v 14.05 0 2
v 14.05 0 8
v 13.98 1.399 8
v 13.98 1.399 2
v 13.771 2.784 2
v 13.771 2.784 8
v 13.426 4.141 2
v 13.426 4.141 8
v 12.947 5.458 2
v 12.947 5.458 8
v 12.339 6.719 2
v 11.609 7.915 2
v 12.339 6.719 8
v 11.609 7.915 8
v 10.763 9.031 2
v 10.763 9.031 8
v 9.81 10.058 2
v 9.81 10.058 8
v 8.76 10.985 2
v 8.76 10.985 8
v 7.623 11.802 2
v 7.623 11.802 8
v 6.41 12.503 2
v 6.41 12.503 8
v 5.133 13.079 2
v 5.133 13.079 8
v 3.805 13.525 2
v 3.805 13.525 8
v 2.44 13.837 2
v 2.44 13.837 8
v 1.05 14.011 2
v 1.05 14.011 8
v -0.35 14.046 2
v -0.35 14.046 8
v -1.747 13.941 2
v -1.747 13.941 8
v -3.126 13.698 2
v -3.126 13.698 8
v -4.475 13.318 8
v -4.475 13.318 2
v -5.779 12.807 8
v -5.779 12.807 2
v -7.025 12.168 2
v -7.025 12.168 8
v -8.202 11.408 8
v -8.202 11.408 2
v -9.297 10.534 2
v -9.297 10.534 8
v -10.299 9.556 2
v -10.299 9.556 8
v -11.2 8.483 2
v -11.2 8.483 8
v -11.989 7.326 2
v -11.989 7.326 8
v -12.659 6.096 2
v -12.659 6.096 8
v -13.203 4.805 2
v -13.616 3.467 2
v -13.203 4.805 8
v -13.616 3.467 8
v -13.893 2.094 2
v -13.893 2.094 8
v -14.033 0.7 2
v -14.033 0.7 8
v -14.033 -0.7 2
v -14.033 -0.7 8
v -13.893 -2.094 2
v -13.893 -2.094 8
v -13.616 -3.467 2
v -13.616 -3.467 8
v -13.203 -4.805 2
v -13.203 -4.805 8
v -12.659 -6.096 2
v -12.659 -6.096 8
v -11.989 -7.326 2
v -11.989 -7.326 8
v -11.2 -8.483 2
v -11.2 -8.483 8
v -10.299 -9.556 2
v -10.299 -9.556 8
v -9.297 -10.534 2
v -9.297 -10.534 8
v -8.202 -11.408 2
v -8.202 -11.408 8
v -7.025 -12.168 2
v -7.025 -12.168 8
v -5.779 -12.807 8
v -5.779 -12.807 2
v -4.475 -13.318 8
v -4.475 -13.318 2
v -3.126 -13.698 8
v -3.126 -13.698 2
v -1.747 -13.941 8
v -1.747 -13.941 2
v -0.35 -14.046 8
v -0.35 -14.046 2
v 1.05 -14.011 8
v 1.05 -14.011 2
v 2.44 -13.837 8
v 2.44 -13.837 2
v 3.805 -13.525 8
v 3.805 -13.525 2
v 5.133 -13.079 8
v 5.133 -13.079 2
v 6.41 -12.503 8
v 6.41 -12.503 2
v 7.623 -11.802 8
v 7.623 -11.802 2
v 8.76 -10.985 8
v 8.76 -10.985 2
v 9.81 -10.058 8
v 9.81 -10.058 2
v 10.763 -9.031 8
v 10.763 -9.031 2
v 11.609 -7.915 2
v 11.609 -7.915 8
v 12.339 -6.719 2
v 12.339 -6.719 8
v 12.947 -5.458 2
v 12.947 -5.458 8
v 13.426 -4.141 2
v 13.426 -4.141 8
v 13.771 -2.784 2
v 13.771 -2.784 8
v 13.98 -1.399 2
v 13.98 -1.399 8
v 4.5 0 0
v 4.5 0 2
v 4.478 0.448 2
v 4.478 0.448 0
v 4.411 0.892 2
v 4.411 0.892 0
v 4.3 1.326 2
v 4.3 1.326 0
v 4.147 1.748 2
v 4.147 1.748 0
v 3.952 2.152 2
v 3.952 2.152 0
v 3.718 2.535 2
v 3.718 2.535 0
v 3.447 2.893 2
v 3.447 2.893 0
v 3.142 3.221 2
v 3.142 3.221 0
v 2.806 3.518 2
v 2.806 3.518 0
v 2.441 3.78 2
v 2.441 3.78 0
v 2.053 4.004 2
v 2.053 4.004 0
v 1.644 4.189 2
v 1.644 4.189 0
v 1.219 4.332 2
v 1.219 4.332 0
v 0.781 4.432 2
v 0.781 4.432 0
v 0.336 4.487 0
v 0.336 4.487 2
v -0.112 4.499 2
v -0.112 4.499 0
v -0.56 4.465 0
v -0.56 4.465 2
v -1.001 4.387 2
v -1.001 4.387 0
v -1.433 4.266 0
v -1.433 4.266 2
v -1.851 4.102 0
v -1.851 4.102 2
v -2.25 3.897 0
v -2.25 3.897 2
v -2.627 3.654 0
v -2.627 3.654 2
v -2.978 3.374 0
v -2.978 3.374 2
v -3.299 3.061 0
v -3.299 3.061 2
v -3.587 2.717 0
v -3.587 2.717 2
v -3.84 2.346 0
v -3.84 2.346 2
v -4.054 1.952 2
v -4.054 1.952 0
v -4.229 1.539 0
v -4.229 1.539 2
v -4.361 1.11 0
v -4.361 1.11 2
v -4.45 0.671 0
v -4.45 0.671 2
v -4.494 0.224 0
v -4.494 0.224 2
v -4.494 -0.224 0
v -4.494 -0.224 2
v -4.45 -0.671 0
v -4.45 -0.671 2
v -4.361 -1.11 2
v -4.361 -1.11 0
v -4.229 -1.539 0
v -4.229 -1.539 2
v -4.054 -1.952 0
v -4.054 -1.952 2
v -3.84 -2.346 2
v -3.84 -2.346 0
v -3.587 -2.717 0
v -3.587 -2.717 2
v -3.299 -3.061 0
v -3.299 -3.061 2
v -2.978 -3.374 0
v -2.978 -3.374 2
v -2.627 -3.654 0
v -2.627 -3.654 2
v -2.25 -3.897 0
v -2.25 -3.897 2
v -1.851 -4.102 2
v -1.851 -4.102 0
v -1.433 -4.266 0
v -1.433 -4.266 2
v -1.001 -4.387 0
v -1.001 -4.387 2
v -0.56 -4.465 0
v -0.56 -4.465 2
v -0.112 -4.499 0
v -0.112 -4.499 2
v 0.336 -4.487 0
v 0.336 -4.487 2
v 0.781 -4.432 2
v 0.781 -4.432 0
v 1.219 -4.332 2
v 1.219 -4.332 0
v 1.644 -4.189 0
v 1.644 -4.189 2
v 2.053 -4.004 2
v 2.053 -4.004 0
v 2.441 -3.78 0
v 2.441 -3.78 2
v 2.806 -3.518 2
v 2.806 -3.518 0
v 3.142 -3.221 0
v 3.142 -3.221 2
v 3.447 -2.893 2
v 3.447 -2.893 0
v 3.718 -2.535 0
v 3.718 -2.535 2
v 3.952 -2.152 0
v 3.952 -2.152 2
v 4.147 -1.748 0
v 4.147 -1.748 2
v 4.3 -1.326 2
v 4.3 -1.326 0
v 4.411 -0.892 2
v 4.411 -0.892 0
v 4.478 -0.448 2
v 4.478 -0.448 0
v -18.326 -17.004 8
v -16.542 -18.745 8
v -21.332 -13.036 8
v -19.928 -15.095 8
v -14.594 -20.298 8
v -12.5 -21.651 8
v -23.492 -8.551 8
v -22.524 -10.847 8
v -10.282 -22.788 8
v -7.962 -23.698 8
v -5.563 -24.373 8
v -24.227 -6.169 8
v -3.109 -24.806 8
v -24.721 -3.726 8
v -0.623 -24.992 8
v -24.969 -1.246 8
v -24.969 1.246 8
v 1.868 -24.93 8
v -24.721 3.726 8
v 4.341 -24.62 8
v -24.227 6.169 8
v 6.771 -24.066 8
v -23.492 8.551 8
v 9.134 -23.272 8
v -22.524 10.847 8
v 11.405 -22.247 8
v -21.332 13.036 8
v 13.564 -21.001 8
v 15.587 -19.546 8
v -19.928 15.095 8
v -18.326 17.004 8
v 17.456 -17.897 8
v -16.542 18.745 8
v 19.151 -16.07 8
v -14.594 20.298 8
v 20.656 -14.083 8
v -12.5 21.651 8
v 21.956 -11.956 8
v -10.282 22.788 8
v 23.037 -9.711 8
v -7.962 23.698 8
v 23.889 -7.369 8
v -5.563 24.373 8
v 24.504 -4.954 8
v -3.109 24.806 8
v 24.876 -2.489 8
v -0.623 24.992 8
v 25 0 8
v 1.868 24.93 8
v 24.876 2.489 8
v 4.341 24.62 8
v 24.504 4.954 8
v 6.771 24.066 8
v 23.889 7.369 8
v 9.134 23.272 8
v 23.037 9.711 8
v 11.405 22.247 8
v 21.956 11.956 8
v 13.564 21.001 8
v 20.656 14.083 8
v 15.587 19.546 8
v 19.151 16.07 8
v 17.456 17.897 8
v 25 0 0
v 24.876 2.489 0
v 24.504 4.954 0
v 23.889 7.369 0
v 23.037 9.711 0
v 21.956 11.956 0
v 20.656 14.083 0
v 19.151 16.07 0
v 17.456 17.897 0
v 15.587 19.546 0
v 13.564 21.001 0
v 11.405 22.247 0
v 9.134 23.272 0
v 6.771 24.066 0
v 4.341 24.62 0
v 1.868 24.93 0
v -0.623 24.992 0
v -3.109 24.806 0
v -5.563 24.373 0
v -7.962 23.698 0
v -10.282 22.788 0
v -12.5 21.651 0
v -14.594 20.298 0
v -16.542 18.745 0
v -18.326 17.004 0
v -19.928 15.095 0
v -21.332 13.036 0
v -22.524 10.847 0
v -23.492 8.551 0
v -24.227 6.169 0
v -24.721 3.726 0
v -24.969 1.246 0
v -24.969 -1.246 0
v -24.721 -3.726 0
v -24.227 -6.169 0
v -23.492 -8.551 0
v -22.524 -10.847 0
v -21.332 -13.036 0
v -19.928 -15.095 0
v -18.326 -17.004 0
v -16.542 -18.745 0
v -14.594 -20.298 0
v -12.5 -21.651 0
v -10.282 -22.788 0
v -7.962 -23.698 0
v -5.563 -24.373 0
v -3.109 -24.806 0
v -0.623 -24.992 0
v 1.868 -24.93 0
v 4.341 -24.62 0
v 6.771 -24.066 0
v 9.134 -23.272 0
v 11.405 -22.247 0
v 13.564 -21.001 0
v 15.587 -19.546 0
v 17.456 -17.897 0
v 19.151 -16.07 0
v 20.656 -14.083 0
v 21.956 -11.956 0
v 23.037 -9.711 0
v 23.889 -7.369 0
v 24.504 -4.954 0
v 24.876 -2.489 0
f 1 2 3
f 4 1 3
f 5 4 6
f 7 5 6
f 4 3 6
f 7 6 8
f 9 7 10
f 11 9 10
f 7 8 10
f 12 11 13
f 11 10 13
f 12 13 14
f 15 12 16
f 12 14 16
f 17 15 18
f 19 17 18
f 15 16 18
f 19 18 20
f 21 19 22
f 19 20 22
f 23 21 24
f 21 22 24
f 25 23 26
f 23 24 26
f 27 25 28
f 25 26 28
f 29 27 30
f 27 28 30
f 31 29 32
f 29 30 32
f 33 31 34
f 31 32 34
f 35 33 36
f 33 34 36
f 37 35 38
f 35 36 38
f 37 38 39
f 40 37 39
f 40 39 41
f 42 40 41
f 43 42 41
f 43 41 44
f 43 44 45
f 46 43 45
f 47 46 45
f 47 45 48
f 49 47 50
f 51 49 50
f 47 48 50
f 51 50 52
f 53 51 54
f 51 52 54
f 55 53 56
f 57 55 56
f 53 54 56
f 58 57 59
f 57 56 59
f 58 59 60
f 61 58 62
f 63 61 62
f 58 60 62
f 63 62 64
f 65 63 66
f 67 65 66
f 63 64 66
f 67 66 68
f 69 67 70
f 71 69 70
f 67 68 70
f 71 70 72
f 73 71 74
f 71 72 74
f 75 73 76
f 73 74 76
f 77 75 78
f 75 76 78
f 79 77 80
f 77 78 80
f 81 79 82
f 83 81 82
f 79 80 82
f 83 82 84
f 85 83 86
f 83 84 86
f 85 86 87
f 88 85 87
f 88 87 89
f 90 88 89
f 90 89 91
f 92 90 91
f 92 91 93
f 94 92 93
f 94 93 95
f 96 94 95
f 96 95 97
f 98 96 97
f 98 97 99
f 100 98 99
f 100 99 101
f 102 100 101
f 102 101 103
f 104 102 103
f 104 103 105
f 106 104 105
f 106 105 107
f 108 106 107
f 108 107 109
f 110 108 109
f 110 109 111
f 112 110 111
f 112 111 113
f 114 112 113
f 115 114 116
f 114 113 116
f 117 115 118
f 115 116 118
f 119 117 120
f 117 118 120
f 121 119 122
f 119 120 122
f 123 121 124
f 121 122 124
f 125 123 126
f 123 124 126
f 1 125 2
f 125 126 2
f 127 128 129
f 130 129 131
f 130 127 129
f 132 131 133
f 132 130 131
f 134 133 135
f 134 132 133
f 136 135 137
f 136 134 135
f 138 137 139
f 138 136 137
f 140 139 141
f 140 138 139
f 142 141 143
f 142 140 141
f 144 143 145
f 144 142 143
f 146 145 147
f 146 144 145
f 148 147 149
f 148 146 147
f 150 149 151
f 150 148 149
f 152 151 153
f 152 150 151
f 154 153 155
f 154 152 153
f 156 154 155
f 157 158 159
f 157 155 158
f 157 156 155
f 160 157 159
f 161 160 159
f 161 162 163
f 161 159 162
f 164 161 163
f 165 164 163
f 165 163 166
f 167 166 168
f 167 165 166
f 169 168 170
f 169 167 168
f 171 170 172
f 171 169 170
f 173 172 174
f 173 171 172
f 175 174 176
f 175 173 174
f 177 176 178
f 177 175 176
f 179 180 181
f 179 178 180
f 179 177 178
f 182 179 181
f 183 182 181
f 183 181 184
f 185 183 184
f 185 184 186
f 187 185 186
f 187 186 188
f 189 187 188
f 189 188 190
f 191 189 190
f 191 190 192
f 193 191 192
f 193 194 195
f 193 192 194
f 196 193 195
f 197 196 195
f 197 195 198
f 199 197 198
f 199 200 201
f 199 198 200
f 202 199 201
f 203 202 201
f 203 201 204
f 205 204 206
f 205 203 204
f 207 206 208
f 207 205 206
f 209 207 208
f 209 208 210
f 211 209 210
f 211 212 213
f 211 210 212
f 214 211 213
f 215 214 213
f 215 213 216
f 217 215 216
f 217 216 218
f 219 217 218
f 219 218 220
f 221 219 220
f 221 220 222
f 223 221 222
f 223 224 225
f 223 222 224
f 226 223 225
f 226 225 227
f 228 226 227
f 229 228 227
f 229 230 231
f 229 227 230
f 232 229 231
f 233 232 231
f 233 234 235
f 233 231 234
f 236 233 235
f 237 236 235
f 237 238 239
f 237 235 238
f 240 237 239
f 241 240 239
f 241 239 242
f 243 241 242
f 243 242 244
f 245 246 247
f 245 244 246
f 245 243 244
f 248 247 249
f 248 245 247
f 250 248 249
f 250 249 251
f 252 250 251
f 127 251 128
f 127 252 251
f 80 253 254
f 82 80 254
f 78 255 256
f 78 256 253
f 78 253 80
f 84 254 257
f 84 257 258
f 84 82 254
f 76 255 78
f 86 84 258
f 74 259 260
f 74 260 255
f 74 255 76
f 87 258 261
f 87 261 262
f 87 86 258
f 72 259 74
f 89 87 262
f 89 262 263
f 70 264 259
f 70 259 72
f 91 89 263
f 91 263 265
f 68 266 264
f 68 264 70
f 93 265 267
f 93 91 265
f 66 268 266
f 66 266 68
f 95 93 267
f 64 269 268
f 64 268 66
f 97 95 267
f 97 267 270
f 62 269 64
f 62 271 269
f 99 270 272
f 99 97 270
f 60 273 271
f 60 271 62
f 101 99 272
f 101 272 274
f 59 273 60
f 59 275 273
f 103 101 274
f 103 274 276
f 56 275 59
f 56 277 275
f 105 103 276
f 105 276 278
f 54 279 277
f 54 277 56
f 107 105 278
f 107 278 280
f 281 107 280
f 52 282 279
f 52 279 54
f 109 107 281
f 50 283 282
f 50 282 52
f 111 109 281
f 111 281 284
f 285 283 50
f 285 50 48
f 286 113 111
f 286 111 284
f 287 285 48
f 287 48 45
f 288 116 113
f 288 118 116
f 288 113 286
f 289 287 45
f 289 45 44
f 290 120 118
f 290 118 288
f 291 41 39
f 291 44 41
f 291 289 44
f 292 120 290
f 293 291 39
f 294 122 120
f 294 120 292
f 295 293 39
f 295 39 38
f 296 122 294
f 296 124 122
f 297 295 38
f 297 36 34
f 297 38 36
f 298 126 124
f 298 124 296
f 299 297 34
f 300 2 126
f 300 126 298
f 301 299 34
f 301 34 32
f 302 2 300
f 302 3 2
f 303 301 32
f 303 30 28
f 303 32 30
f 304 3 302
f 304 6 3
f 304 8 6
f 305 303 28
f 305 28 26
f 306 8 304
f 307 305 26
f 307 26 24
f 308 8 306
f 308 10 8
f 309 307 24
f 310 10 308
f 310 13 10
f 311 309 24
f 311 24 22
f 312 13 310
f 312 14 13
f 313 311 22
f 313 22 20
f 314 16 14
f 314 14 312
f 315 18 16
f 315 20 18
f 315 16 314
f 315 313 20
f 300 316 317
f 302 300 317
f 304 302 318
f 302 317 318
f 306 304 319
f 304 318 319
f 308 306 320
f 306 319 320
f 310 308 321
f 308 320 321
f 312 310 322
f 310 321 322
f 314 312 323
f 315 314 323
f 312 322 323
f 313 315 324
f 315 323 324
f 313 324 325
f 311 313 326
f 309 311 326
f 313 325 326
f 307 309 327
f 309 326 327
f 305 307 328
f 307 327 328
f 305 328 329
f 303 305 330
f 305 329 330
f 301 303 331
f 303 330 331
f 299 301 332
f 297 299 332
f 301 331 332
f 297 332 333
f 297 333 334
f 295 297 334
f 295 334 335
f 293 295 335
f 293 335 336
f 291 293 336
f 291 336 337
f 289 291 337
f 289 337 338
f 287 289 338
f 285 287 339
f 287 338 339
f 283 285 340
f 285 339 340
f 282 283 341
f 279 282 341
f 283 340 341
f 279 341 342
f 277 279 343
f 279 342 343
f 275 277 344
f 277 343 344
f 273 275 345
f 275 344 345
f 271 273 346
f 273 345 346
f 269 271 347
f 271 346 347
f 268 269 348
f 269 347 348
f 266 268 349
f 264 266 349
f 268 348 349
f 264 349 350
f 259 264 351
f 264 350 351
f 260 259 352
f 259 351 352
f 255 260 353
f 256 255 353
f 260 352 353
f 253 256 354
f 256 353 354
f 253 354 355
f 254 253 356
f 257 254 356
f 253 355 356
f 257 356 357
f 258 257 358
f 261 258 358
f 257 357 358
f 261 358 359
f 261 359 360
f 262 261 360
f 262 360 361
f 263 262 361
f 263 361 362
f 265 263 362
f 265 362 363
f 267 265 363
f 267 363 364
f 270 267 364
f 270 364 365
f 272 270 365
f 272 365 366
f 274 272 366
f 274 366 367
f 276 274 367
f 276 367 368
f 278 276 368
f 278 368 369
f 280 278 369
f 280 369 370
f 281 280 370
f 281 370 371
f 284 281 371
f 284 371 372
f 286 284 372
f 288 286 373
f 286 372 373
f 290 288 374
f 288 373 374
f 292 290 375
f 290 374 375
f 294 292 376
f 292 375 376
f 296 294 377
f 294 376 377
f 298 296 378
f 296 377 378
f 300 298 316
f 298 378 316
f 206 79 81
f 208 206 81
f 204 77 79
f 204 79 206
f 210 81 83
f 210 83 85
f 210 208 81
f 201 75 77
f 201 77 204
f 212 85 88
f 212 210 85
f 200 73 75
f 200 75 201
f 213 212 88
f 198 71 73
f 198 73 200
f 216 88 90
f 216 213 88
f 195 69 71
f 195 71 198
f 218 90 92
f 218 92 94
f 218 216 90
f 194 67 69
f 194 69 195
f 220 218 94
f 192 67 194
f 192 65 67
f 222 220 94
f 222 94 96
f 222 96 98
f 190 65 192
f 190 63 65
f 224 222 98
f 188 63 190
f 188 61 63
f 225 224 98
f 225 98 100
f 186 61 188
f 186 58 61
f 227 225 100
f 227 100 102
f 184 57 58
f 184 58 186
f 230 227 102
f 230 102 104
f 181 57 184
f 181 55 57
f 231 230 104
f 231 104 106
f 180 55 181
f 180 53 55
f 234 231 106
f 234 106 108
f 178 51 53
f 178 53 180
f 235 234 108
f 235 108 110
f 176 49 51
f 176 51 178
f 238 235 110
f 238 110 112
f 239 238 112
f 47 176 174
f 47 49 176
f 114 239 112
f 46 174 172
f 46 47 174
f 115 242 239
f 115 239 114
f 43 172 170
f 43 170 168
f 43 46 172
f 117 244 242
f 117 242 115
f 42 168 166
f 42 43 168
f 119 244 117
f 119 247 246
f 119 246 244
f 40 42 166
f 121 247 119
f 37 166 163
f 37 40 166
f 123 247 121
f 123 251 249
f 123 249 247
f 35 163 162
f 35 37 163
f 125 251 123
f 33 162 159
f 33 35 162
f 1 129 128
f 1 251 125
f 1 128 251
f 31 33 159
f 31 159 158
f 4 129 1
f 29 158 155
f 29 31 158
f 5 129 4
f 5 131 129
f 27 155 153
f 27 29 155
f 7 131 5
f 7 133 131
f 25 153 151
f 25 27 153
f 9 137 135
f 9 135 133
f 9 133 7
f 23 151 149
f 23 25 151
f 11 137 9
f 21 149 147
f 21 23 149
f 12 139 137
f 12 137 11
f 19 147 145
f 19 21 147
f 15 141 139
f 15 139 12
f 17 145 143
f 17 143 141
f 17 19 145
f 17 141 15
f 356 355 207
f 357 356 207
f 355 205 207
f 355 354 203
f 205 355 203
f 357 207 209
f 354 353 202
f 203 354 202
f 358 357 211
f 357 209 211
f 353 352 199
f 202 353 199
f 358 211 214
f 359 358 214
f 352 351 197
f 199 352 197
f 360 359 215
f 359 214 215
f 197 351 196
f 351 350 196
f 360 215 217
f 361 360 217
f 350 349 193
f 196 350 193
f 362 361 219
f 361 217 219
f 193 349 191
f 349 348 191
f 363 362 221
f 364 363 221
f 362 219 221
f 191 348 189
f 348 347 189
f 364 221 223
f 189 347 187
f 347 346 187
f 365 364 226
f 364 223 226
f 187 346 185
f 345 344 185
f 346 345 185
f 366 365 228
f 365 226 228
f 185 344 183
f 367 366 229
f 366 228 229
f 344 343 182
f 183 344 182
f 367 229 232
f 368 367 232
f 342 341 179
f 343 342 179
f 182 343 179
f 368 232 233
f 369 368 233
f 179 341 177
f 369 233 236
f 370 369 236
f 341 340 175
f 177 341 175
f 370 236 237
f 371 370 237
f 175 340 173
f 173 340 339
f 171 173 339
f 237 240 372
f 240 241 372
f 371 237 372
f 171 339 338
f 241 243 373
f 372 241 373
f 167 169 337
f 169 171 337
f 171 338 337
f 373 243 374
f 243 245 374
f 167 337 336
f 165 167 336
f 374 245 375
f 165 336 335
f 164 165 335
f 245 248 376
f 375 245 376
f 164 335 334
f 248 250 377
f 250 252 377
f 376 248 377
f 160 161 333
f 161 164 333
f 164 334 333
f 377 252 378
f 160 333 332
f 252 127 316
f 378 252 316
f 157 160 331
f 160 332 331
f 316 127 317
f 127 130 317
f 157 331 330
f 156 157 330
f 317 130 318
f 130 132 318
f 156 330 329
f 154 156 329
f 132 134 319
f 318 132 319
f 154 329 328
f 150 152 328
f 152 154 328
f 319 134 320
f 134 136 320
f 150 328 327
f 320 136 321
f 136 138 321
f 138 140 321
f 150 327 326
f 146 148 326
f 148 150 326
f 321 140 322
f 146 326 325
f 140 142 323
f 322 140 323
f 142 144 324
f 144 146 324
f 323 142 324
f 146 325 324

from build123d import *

# Parameters (mm, degrees)
SKETCH_1_R          = 25
EXTRUDE_1_DEPTH     = 8
SKETCH_7_R          = 14.05
CUT_EXTRUDE_6_DEPTH = 6
SKETCH_2_R          = 4.5
CUT_EXTRUDE_7_DEPTH = 11.5


with BuildPart() as part:
    # 草圖1 → 填料-伸長1 (new body)
    with BuildSketch(Plane.XY):
        Circle(SKETCH_1_R)
    extrude(amount=EXTRUDE_1_DEPTH)

    # 草圖7 → 除料-伸長6 (cut)
    with BuildSketch(Plane.XY.offset(8)):
        Circle(SKETCH_7_R)
    extrude(amount=-CUT_EXTRUDE_6_DEPTH, mode=Mode.SUBTRACT)

    # 草圖2 → 除料-伸長7 (cut)
    with BuildSketch(Plane.XY):
        Circle(SKETCH_2_R)
    extrude(amount=CUT_EXTRUDE_7_DEPTH, mode=Mode.SUBTRACT)


solid = part.part
